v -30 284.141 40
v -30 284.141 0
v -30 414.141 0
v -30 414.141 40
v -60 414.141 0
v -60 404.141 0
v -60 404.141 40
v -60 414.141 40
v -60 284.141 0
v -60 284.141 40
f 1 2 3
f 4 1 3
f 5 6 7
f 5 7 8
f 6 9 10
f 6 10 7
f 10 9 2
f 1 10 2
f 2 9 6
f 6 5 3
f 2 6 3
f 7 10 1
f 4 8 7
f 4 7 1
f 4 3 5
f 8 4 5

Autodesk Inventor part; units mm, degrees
ref_plane "YZ Plane" through (0, 0, 0) normal (1, 0, 0) x (0, 1, 0)
ref_plane "XZ Plane" through (0, 0, 0) normal (0, 1, 0) x (-1, 0, 0)
ref_plane "XY Plane" through (0, 0, 0) normal (0, 0, 1) x (1, 0, 0)
ref_plane "Work Plane1" through (0, 0, 0) normal (0, 0, 1) x (1, 0, 0)
sketch "Sketch1" plane through (0, 0, 0) normal (0, 0, 1) x (1, 0, 0)
  line L0 (-10, -149.0271) -> (-140, -149.0271) projected
  line L1 (-10, -149.0271) -> (-10, 350) projected
  spline S0 degree 3 poles (-55.3463, 478.2829) (-54.4199, 477.2402) (-53.5281, 476.1834) (-41.973, 461.9491) (-29.8681, 440.3891) (-13.701, 393.2059) (-10, 371.2252) (-10, 350) knots -13.956375 -13.956375 -13.956375 -13.956375 -13.398469 -13.398469 -6.367551 -6.367551 0 0 0 0 projected
  line L2 (-55.3463, 478.2829) -> (-94.6537, 478.2829) projected
  spline S1 degree 3 poles (-140, 350) (-140, 366.1219) (-137.8703, 382.0269) (-130.4211, 411.7266) (-125.3688, 425.7323) (-111.9139, 454.5302) (-103.4651, 468.0052) (-95.3677, 477.4713) (-95.011, 477.8807) (-94.6537, 478.2829) knots -5.300276 -5.300276 -5.300276 -5.300276 -3.93351 -3.93351 -2.695997 -2.695997 -1.209053 -1.209053 -1.140685 -1.140685 -1.140685 -1.140685 projected
  line L3 (-140, -149.0271) -> (-140, 350) projected
  line L4 (-90, 404.1414) -> (-60, 404.1414) projected
  line L5 (-60, 404.1414) -> (-60, 434.1414) projected
  line L6 (-60, 434.1414) -> (-90, 434.1414) projected
  line L7 (-90, 434.1414) -> (-90, 404.1414) projected
  line L8 (-90, 284.1414) -> (-60, 284.1414) projected
  line L9 (-60, 284.1414) -> (-60, 404.1414) projected
  line L10 (-60, 404.1414) -> (-90, 404.1414) projected
  line L11 (-90, 404.1414) -> (-90, 284.1414) projected
  line L12 (-60, 284.1414) -> (-30, 284.1414)
  line L13 (-30, 284.1414) -> (-30, 414.1414)
  line L14 (-30, 414.1414) -> (-60, 414.1414)
  line L15 (-60, 414.1414) -> (-60, 284.1414)
  point P0 (0, 0)
  dimension "d0" = 30
  dimension "d1" = 130
extrude "Extrusion1" add sketch "Sketch1" along normal blind 40 contours L5 L14 L13 L12 L9
properties part number "Avionics1"
